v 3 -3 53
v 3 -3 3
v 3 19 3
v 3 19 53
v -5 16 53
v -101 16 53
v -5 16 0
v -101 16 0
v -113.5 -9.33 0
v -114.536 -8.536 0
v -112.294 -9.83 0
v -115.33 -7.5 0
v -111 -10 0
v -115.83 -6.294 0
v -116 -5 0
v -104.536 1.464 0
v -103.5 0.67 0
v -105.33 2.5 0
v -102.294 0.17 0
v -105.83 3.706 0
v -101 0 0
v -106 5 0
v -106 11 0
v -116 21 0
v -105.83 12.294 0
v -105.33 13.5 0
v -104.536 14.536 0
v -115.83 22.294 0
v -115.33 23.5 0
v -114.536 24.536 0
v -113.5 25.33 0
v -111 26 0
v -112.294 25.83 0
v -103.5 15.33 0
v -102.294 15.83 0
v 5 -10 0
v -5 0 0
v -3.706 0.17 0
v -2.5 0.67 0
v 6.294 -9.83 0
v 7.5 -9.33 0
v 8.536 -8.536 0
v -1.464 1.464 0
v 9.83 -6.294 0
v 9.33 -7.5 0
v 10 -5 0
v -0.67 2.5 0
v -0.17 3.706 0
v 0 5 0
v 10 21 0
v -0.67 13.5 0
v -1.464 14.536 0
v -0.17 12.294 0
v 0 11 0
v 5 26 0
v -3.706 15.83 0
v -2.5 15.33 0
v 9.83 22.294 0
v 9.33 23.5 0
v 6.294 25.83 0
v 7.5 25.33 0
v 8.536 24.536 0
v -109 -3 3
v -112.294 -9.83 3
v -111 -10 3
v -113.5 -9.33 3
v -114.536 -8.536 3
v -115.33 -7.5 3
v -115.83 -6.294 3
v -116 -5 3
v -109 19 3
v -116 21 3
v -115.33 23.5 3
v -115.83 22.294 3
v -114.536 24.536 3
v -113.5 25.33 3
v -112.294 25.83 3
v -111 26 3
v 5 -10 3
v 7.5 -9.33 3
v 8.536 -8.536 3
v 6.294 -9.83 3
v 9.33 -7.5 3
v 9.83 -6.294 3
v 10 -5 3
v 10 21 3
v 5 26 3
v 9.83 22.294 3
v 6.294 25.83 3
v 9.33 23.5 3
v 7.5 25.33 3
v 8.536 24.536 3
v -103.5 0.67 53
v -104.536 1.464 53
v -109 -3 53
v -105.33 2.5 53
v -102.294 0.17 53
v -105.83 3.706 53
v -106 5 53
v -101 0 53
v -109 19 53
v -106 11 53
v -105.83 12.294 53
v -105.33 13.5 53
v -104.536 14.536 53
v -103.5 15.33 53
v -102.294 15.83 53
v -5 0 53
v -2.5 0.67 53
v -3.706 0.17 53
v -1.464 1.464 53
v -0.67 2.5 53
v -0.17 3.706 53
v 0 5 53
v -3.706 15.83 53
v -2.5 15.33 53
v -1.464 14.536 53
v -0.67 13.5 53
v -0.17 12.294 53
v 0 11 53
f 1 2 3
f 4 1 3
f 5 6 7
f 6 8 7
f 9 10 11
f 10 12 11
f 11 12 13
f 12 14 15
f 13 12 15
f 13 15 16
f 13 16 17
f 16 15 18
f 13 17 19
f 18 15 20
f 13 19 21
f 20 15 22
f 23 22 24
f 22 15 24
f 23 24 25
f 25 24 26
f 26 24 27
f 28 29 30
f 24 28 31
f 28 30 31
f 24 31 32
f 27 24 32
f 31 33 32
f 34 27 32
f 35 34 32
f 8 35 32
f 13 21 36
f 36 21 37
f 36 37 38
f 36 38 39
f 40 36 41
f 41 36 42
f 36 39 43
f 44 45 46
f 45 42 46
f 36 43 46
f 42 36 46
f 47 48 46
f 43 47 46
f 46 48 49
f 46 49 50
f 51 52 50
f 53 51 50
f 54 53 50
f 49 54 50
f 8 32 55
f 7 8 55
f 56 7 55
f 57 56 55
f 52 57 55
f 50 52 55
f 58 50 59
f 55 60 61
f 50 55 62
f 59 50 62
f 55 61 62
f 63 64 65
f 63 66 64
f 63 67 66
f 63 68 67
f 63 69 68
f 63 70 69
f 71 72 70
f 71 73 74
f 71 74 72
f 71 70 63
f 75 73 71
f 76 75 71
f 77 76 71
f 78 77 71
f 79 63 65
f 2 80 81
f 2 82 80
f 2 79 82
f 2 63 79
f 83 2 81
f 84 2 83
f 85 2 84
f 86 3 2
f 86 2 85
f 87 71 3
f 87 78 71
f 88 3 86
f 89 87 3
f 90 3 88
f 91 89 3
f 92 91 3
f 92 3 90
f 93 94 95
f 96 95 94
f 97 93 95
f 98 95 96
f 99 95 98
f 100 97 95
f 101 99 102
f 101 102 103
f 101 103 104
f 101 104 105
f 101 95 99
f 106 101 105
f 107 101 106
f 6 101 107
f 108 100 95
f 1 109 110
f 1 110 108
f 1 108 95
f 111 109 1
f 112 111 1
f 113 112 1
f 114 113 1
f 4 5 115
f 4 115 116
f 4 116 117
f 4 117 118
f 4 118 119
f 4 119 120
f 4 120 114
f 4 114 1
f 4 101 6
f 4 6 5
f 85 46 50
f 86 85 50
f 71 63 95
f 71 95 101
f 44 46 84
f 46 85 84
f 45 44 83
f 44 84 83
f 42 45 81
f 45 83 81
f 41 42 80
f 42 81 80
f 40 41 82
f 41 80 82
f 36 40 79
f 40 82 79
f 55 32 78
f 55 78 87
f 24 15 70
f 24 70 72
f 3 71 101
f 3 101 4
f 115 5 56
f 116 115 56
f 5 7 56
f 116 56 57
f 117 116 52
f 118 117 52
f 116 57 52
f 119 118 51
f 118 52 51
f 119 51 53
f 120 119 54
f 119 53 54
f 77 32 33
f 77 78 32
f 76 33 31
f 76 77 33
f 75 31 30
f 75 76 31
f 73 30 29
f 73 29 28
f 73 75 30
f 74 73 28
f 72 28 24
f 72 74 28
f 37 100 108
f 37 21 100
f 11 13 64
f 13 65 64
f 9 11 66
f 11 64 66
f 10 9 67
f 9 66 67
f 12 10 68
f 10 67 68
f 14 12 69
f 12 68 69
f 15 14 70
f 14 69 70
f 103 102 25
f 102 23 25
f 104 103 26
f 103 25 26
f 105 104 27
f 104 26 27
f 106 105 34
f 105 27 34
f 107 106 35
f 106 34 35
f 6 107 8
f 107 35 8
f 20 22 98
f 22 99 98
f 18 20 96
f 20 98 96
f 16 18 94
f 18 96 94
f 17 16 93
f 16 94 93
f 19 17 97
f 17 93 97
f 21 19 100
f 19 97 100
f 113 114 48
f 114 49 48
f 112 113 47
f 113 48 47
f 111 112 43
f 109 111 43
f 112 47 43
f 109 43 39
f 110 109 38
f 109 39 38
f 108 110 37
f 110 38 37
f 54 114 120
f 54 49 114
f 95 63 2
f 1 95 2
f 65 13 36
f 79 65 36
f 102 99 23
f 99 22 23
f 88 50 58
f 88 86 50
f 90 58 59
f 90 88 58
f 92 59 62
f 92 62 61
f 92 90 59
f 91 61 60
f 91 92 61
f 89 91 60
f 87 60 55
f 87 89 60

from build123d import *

# Parameters (mm, degrees)
F0_W     = 126
F0_H     = 36
F0_W_2   = 106
F0_H_2   = 16
F1_DEPTH = 3
F2_W     = 112
F2_H     = 22
F2_W_2   = 106
F2_H_2   = 16
F3_DEPTH = 50
F4_R     = 5


with BuildPart() as f1:
    # F0 (on Top) → F1 (new body)
    with BuildSketch(Plane.XY):
        with Locations((-53, 8)):
            Rectangle(F0_W, F0_H)
        with Locations((-53, 8)):
            Rectangle(F0_W_2, F0_H_2, mode=Mode.SUBTRACT)
    extrude(amount=F1_DEPTH)

    # F2 (on face) → F3 (join)
    with BuildSketch(Plane.XY.offset(3)):
        with Locations((-53, 8)):
            Rectangle(F2_W, F2_H)
        with Locations((-53, 8)):
            Rectangle(F2_W_2, F2_H_2, mode=Mode.SUBTRACT)
    extrude(amount=F3_DEPTH)

    # F4
    f4_edges = [f1.edges().sort_by_distance(p)[0] for p in [
        (-116, 26, 1.5),
        (10, 26, 1.5),
        (10, -10, 1.5),
        (-116, -10, 1.5),
        (-106, 16, 26.5),
        (0, 16, 26.5),
        (0, 0, 26.5),
        (-106, 0, 26.5),
    ]]
    fillet(f4_edges, radius=F4_R)


solid = f1.part
